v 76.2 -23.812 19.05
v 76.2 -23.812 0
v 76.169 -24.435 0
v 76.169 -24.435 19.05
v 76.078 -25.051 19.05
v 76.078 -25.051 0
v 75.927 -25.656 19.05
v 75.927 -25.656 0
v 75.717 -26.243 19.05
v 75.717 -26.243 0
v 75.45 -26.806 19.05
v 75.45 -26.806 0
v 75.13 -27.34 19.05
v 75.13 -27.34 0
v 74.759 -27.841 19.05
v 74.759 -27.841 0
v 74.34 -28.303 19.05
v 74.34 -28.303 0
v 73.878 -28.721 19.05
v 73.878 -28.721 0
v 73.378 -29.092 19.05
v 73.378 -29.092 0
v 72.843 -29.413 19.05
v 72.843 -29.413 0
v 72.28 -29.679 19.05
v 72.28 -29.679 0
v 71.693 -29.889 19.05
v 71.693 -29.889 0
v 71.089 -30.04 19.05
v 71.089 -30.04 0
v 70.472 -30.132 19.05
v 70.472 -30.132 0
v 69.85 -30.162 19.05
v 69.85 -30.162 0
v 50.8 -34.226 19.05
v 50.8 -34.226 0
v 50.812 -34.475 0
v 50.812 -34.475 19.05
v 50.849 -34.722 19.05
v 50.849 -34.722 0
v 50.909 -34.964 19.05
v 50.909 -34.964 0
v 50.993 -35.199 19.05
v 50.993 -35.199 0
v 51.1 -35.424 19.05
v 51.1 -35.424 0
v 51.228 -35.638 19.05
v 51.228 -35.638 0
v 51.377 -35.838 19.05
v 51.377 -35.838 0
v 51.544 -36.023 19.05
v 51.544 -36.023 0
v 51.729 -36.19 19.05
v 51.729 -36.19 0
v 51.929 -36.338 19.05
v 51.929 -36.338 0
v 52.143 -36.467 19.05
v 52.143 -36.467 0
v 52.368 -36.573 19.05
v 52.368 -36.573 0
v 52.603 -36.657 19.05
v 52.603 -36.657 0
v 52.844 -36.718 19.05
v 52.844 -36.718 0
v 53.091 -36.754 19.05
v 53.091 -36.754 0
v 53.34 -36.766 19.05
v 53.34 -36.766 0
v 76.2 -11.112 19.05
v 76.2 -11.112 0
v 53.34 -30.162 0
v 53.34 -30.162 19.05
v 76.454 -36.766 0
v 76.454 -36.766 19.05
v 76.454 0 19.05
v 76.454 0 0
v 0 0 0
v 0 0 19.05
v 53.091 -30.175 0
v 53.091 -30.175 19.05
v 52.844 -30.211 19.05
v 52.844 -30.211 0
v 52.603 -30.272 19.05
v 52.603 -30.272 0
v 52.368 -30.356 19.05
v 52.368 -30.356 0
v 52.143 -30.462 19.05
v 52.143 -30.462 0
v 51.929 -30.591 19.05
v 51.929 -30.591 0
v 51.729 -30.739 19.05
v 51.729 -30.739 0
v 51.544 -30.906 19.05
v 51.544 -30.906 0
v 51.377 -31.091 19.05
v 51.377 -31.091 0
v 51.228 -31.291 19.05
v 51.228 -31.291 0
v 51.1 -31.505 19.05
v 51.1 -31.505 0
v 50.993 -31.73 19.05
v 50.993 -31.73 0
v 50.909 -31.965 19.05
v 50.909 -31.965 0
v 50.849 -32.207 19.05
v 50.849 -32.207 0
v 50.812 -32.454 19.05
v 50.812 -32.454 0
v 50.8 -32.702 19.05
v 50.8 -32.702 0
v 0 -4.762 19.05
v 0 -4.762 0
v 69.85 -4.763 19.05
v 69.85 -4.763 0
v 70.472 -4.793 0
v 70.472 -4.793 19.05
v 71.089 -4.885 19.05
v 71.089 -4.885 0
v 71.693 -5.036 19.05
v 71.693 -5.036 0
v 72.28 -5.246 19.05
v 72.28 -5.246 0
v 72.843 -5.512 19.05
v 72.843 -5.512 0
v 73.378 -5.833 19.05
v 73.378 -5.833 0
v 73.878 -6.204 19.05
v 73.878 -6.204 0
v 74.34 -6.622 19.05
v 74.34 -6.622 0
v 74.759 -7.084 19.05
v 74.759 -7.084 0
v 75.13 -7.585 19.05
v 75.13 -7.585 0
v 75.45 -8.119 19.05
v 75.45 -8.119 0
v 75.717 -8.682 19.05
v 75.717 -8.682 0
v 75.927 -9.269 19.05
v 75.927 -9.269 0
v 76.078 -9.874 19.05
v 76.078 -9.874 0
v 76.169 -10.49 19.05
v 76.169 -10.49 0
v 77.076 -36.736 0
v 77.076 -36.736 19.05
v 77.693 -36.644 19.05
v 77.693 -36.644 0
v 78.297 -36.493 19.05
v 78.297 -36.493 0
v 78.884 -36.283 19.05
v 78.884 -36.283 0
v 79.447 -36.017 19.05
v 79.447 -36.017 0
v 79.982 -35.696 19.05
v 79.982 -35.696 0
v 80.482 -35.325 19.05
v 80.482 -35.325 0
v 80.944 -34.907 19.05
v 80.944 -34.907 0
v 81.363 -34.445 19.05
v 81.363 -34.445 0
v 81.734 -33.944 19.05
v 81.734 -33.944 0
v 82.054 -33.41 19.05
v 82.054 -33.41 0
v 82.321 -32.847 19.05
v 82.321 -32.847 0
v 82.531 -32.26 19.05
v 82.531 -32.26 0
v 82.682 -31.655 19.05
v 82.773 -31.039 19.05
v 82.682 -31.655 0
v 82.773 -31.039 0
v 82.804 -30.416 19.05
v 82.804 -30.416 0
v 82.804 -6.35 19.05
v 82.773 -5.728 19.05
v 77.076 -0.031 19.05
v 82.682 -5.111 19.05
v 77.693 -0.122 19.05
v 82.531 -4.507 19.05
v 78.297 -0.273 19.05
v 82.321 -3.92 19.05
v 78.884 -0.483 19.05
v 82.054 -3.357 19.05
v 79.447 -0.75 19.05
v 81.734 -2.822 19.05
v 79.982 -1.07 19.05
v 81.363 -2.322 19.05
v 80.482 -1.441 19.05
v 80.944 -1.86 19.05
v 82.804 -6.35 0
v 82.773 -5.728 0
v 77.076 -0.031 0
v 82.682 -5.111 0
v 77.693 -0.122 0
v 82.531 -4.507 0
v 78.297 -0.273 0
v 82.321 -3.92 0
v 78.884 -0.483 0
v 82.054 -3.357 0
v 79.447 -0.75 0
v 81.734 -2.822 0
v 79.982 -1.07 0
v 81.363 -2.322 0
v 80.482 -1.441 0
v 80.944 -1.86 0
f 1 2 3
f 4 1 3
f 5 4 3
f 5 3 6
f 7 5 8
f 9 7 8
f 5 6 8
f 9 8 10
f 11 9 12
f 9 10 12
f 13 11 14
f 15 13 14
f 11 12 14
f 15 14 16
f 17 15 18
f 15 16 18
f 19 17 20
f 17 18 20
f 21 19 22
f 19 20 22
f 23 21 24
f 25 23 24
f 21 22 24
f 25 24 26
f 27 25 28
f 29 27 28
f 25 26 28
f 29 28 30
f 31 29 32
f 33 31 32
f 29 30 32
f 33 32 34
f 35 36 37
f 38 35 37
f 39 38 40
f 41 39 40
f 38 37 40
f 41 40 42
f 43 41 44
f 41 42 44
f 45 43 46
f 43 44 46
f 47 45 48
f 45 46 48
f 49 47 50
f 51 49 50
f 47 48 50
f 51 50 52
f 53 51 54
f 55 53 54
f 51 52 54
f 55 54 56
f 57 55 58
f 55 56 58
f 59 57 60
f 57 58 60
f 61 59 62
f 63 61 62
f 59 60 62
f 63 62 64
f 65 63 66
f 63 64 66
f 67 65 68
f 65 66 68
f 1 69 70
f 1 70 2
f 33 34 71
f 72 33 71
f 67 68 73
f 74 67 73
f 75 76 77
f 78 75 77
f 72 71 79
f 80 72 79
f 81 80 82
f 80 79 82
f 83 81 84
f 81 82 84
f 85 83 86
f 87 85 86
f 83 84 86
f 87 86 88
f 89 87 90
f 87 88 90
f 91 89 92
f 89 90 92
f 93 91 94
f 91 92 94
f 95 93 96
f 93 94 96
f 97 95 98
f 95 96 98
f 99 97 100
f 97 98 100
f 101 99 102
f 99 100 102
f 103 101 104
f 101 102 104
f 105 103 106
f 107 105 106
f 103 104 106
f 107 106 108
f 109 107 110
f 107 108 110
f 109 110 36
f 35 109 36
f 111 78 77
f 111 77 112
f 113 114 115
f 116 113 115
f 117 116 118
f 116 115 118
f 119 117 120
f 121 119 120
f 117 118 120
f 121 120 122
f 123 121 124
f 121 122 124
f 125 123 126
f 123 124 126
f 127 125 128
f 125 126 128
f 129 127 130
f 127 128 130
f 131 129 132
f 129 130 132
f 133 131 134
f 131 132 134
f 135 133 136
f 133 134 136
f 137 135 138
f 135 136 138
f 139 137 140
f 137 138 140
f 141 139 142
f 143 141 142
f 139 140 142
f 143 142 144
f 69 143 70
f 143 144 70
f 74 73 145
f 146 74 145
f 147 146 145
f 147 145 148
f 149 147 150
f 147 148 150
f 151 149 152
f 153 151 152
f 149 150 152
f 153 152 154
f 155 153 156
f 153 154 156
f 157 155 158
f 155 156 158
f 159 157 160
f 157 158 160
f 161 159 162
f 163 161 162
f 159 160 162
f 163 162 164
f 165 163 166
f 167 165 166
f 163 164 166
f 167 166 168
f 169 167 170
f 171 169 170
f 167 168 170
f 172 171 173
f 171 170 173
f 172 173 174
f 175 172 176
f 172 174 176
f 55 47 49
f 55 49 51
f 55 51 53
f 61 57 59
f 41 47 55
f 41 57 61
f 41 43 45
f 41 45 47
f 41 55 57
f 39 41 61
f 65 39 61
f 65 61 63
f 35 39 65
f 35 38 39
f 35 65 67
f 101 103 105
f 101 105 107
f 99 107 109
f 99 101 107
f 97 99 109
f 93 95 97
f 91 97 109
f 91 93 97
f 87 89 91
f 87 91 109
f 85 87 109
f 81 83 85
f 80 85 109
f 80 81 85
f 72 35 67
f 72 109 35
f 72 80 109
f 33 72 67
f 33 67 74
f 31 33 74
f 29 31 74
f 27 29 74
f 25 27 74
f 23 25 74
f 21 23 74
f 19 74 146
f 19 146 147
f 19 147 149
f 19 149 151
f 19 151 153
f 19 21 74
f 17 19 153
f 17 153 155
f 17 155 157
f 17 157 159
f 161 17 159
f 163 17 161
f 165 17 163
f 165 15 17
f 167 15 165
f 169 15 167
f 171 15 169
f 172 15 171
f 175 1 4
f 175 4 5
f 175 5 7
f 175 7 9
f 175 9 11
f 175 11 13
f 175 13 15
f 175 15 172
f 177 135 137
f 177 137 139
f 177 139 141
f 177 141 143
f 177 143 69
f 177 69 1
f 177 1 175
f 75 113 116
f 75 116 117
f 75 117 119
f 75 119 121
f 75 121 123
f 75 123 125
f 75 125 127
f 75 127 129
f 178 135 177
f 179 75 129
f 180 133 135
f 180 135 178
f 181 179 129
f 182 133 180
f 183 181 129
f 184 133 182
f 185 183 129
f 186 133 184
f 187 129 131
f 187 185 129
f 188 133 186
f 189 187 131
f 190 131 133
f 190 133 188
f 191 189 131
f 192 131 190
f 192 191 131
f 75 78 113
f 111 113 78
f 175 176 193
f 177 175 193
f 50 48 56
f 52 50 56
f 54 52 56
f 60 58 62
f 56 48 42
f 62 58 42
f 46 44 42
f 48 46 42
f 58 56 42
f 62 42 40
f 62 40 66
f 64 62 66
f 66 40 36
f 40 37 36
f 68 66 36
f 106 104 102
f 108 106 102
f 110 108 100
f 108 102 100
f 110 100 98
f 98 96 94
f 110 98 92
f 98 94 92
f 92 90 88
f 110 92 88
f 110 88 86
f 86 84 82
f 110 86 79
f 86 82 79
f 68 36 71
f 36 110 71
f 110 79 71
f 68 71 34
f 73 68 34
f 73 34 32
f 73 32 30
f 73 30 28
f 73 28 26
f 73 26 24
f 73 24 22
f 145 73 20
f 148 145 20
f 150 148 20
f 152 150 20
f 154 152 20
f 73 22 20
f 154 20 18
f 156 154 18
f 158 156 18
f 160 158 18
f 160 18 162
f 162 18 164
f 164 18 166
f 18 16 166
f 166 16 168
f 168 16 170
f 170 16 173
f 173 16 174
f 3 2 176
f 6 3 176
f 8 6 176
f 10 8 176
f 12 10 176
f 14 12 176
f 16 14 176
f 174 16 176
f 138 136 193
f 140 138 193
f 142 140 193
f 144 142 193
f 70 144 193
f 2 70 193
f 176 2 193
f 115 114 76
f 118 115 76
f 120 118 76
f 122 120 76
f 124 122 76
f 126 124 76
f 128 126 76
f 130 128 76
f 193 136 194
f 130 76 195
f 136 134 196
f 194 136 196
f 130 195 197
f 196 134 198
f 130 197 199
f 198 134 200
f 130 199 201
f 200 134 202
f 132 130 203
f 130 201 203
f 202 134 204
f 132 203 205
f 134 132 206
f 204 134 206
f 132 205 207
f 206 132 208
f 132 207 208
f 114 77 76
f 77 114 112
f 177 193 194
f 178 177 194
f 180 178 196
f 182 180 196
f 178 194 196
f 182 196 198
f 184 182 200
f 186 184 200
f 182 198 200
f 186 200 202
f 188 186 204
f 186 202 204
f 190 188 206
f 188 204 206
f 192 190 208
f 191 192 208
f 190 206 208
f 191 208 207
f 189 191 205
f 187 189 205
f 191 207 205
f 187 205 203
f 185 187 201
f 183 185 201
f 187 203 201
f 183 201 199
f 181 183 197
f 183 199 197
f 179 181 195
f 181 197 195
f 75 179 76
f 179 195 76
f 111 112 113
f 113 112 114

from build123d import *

# Parameters (mm, degrees)
F1_DEPTH = 19.05


with BuildPart() as f1:
    # F0 (on Top) → F1 (new body)
    with BuildSketch(Plane.XY):
        with BuildLine():
            Line((76.453999, 0), (0, 0))
            Line((0, 0), (0, -4.7625))
            Line((0, -4.7625), (69.85, -4.7625))
            ThreePointArc((69.85, -4.7625), (74.340128, -6.622372), (76.2, -11.1125))
            Line((76.2, -11.1125), (76.2, -23.8125))
            ThreePointArc((76.2, -23.8125), (74.340128, -28.302628), (69.85, -30.1625))
            Line((69.85, -30.1625), (53.34, -30.1625))
            ThreePointArc((53.34, -30.1625), (51.543949, -30.906449), (50.8, -32.7025))
            Line((50.8, -32.7025), (50.8, -34.226499))
            ThreePointArc((50.8, -34.226499), (51.543949, -36.022551), (53.34, -36.766499))
            Line((53.34, -36.766499), (76.453999, -36.766499))
            ThreePointArc((76.453999, -36.766499), (80.944127, -34.906627), (82.803999, -30.416499))
            Line((82.803999, -30.416499), (82.803999, -6.35))
            ThreePointArc((82.803999, -6.35), (80.944127, -1.859872), (76.453999, 0))
        make_face()
    extrude(amount=F1_DEPTH)


solid = f1.part
